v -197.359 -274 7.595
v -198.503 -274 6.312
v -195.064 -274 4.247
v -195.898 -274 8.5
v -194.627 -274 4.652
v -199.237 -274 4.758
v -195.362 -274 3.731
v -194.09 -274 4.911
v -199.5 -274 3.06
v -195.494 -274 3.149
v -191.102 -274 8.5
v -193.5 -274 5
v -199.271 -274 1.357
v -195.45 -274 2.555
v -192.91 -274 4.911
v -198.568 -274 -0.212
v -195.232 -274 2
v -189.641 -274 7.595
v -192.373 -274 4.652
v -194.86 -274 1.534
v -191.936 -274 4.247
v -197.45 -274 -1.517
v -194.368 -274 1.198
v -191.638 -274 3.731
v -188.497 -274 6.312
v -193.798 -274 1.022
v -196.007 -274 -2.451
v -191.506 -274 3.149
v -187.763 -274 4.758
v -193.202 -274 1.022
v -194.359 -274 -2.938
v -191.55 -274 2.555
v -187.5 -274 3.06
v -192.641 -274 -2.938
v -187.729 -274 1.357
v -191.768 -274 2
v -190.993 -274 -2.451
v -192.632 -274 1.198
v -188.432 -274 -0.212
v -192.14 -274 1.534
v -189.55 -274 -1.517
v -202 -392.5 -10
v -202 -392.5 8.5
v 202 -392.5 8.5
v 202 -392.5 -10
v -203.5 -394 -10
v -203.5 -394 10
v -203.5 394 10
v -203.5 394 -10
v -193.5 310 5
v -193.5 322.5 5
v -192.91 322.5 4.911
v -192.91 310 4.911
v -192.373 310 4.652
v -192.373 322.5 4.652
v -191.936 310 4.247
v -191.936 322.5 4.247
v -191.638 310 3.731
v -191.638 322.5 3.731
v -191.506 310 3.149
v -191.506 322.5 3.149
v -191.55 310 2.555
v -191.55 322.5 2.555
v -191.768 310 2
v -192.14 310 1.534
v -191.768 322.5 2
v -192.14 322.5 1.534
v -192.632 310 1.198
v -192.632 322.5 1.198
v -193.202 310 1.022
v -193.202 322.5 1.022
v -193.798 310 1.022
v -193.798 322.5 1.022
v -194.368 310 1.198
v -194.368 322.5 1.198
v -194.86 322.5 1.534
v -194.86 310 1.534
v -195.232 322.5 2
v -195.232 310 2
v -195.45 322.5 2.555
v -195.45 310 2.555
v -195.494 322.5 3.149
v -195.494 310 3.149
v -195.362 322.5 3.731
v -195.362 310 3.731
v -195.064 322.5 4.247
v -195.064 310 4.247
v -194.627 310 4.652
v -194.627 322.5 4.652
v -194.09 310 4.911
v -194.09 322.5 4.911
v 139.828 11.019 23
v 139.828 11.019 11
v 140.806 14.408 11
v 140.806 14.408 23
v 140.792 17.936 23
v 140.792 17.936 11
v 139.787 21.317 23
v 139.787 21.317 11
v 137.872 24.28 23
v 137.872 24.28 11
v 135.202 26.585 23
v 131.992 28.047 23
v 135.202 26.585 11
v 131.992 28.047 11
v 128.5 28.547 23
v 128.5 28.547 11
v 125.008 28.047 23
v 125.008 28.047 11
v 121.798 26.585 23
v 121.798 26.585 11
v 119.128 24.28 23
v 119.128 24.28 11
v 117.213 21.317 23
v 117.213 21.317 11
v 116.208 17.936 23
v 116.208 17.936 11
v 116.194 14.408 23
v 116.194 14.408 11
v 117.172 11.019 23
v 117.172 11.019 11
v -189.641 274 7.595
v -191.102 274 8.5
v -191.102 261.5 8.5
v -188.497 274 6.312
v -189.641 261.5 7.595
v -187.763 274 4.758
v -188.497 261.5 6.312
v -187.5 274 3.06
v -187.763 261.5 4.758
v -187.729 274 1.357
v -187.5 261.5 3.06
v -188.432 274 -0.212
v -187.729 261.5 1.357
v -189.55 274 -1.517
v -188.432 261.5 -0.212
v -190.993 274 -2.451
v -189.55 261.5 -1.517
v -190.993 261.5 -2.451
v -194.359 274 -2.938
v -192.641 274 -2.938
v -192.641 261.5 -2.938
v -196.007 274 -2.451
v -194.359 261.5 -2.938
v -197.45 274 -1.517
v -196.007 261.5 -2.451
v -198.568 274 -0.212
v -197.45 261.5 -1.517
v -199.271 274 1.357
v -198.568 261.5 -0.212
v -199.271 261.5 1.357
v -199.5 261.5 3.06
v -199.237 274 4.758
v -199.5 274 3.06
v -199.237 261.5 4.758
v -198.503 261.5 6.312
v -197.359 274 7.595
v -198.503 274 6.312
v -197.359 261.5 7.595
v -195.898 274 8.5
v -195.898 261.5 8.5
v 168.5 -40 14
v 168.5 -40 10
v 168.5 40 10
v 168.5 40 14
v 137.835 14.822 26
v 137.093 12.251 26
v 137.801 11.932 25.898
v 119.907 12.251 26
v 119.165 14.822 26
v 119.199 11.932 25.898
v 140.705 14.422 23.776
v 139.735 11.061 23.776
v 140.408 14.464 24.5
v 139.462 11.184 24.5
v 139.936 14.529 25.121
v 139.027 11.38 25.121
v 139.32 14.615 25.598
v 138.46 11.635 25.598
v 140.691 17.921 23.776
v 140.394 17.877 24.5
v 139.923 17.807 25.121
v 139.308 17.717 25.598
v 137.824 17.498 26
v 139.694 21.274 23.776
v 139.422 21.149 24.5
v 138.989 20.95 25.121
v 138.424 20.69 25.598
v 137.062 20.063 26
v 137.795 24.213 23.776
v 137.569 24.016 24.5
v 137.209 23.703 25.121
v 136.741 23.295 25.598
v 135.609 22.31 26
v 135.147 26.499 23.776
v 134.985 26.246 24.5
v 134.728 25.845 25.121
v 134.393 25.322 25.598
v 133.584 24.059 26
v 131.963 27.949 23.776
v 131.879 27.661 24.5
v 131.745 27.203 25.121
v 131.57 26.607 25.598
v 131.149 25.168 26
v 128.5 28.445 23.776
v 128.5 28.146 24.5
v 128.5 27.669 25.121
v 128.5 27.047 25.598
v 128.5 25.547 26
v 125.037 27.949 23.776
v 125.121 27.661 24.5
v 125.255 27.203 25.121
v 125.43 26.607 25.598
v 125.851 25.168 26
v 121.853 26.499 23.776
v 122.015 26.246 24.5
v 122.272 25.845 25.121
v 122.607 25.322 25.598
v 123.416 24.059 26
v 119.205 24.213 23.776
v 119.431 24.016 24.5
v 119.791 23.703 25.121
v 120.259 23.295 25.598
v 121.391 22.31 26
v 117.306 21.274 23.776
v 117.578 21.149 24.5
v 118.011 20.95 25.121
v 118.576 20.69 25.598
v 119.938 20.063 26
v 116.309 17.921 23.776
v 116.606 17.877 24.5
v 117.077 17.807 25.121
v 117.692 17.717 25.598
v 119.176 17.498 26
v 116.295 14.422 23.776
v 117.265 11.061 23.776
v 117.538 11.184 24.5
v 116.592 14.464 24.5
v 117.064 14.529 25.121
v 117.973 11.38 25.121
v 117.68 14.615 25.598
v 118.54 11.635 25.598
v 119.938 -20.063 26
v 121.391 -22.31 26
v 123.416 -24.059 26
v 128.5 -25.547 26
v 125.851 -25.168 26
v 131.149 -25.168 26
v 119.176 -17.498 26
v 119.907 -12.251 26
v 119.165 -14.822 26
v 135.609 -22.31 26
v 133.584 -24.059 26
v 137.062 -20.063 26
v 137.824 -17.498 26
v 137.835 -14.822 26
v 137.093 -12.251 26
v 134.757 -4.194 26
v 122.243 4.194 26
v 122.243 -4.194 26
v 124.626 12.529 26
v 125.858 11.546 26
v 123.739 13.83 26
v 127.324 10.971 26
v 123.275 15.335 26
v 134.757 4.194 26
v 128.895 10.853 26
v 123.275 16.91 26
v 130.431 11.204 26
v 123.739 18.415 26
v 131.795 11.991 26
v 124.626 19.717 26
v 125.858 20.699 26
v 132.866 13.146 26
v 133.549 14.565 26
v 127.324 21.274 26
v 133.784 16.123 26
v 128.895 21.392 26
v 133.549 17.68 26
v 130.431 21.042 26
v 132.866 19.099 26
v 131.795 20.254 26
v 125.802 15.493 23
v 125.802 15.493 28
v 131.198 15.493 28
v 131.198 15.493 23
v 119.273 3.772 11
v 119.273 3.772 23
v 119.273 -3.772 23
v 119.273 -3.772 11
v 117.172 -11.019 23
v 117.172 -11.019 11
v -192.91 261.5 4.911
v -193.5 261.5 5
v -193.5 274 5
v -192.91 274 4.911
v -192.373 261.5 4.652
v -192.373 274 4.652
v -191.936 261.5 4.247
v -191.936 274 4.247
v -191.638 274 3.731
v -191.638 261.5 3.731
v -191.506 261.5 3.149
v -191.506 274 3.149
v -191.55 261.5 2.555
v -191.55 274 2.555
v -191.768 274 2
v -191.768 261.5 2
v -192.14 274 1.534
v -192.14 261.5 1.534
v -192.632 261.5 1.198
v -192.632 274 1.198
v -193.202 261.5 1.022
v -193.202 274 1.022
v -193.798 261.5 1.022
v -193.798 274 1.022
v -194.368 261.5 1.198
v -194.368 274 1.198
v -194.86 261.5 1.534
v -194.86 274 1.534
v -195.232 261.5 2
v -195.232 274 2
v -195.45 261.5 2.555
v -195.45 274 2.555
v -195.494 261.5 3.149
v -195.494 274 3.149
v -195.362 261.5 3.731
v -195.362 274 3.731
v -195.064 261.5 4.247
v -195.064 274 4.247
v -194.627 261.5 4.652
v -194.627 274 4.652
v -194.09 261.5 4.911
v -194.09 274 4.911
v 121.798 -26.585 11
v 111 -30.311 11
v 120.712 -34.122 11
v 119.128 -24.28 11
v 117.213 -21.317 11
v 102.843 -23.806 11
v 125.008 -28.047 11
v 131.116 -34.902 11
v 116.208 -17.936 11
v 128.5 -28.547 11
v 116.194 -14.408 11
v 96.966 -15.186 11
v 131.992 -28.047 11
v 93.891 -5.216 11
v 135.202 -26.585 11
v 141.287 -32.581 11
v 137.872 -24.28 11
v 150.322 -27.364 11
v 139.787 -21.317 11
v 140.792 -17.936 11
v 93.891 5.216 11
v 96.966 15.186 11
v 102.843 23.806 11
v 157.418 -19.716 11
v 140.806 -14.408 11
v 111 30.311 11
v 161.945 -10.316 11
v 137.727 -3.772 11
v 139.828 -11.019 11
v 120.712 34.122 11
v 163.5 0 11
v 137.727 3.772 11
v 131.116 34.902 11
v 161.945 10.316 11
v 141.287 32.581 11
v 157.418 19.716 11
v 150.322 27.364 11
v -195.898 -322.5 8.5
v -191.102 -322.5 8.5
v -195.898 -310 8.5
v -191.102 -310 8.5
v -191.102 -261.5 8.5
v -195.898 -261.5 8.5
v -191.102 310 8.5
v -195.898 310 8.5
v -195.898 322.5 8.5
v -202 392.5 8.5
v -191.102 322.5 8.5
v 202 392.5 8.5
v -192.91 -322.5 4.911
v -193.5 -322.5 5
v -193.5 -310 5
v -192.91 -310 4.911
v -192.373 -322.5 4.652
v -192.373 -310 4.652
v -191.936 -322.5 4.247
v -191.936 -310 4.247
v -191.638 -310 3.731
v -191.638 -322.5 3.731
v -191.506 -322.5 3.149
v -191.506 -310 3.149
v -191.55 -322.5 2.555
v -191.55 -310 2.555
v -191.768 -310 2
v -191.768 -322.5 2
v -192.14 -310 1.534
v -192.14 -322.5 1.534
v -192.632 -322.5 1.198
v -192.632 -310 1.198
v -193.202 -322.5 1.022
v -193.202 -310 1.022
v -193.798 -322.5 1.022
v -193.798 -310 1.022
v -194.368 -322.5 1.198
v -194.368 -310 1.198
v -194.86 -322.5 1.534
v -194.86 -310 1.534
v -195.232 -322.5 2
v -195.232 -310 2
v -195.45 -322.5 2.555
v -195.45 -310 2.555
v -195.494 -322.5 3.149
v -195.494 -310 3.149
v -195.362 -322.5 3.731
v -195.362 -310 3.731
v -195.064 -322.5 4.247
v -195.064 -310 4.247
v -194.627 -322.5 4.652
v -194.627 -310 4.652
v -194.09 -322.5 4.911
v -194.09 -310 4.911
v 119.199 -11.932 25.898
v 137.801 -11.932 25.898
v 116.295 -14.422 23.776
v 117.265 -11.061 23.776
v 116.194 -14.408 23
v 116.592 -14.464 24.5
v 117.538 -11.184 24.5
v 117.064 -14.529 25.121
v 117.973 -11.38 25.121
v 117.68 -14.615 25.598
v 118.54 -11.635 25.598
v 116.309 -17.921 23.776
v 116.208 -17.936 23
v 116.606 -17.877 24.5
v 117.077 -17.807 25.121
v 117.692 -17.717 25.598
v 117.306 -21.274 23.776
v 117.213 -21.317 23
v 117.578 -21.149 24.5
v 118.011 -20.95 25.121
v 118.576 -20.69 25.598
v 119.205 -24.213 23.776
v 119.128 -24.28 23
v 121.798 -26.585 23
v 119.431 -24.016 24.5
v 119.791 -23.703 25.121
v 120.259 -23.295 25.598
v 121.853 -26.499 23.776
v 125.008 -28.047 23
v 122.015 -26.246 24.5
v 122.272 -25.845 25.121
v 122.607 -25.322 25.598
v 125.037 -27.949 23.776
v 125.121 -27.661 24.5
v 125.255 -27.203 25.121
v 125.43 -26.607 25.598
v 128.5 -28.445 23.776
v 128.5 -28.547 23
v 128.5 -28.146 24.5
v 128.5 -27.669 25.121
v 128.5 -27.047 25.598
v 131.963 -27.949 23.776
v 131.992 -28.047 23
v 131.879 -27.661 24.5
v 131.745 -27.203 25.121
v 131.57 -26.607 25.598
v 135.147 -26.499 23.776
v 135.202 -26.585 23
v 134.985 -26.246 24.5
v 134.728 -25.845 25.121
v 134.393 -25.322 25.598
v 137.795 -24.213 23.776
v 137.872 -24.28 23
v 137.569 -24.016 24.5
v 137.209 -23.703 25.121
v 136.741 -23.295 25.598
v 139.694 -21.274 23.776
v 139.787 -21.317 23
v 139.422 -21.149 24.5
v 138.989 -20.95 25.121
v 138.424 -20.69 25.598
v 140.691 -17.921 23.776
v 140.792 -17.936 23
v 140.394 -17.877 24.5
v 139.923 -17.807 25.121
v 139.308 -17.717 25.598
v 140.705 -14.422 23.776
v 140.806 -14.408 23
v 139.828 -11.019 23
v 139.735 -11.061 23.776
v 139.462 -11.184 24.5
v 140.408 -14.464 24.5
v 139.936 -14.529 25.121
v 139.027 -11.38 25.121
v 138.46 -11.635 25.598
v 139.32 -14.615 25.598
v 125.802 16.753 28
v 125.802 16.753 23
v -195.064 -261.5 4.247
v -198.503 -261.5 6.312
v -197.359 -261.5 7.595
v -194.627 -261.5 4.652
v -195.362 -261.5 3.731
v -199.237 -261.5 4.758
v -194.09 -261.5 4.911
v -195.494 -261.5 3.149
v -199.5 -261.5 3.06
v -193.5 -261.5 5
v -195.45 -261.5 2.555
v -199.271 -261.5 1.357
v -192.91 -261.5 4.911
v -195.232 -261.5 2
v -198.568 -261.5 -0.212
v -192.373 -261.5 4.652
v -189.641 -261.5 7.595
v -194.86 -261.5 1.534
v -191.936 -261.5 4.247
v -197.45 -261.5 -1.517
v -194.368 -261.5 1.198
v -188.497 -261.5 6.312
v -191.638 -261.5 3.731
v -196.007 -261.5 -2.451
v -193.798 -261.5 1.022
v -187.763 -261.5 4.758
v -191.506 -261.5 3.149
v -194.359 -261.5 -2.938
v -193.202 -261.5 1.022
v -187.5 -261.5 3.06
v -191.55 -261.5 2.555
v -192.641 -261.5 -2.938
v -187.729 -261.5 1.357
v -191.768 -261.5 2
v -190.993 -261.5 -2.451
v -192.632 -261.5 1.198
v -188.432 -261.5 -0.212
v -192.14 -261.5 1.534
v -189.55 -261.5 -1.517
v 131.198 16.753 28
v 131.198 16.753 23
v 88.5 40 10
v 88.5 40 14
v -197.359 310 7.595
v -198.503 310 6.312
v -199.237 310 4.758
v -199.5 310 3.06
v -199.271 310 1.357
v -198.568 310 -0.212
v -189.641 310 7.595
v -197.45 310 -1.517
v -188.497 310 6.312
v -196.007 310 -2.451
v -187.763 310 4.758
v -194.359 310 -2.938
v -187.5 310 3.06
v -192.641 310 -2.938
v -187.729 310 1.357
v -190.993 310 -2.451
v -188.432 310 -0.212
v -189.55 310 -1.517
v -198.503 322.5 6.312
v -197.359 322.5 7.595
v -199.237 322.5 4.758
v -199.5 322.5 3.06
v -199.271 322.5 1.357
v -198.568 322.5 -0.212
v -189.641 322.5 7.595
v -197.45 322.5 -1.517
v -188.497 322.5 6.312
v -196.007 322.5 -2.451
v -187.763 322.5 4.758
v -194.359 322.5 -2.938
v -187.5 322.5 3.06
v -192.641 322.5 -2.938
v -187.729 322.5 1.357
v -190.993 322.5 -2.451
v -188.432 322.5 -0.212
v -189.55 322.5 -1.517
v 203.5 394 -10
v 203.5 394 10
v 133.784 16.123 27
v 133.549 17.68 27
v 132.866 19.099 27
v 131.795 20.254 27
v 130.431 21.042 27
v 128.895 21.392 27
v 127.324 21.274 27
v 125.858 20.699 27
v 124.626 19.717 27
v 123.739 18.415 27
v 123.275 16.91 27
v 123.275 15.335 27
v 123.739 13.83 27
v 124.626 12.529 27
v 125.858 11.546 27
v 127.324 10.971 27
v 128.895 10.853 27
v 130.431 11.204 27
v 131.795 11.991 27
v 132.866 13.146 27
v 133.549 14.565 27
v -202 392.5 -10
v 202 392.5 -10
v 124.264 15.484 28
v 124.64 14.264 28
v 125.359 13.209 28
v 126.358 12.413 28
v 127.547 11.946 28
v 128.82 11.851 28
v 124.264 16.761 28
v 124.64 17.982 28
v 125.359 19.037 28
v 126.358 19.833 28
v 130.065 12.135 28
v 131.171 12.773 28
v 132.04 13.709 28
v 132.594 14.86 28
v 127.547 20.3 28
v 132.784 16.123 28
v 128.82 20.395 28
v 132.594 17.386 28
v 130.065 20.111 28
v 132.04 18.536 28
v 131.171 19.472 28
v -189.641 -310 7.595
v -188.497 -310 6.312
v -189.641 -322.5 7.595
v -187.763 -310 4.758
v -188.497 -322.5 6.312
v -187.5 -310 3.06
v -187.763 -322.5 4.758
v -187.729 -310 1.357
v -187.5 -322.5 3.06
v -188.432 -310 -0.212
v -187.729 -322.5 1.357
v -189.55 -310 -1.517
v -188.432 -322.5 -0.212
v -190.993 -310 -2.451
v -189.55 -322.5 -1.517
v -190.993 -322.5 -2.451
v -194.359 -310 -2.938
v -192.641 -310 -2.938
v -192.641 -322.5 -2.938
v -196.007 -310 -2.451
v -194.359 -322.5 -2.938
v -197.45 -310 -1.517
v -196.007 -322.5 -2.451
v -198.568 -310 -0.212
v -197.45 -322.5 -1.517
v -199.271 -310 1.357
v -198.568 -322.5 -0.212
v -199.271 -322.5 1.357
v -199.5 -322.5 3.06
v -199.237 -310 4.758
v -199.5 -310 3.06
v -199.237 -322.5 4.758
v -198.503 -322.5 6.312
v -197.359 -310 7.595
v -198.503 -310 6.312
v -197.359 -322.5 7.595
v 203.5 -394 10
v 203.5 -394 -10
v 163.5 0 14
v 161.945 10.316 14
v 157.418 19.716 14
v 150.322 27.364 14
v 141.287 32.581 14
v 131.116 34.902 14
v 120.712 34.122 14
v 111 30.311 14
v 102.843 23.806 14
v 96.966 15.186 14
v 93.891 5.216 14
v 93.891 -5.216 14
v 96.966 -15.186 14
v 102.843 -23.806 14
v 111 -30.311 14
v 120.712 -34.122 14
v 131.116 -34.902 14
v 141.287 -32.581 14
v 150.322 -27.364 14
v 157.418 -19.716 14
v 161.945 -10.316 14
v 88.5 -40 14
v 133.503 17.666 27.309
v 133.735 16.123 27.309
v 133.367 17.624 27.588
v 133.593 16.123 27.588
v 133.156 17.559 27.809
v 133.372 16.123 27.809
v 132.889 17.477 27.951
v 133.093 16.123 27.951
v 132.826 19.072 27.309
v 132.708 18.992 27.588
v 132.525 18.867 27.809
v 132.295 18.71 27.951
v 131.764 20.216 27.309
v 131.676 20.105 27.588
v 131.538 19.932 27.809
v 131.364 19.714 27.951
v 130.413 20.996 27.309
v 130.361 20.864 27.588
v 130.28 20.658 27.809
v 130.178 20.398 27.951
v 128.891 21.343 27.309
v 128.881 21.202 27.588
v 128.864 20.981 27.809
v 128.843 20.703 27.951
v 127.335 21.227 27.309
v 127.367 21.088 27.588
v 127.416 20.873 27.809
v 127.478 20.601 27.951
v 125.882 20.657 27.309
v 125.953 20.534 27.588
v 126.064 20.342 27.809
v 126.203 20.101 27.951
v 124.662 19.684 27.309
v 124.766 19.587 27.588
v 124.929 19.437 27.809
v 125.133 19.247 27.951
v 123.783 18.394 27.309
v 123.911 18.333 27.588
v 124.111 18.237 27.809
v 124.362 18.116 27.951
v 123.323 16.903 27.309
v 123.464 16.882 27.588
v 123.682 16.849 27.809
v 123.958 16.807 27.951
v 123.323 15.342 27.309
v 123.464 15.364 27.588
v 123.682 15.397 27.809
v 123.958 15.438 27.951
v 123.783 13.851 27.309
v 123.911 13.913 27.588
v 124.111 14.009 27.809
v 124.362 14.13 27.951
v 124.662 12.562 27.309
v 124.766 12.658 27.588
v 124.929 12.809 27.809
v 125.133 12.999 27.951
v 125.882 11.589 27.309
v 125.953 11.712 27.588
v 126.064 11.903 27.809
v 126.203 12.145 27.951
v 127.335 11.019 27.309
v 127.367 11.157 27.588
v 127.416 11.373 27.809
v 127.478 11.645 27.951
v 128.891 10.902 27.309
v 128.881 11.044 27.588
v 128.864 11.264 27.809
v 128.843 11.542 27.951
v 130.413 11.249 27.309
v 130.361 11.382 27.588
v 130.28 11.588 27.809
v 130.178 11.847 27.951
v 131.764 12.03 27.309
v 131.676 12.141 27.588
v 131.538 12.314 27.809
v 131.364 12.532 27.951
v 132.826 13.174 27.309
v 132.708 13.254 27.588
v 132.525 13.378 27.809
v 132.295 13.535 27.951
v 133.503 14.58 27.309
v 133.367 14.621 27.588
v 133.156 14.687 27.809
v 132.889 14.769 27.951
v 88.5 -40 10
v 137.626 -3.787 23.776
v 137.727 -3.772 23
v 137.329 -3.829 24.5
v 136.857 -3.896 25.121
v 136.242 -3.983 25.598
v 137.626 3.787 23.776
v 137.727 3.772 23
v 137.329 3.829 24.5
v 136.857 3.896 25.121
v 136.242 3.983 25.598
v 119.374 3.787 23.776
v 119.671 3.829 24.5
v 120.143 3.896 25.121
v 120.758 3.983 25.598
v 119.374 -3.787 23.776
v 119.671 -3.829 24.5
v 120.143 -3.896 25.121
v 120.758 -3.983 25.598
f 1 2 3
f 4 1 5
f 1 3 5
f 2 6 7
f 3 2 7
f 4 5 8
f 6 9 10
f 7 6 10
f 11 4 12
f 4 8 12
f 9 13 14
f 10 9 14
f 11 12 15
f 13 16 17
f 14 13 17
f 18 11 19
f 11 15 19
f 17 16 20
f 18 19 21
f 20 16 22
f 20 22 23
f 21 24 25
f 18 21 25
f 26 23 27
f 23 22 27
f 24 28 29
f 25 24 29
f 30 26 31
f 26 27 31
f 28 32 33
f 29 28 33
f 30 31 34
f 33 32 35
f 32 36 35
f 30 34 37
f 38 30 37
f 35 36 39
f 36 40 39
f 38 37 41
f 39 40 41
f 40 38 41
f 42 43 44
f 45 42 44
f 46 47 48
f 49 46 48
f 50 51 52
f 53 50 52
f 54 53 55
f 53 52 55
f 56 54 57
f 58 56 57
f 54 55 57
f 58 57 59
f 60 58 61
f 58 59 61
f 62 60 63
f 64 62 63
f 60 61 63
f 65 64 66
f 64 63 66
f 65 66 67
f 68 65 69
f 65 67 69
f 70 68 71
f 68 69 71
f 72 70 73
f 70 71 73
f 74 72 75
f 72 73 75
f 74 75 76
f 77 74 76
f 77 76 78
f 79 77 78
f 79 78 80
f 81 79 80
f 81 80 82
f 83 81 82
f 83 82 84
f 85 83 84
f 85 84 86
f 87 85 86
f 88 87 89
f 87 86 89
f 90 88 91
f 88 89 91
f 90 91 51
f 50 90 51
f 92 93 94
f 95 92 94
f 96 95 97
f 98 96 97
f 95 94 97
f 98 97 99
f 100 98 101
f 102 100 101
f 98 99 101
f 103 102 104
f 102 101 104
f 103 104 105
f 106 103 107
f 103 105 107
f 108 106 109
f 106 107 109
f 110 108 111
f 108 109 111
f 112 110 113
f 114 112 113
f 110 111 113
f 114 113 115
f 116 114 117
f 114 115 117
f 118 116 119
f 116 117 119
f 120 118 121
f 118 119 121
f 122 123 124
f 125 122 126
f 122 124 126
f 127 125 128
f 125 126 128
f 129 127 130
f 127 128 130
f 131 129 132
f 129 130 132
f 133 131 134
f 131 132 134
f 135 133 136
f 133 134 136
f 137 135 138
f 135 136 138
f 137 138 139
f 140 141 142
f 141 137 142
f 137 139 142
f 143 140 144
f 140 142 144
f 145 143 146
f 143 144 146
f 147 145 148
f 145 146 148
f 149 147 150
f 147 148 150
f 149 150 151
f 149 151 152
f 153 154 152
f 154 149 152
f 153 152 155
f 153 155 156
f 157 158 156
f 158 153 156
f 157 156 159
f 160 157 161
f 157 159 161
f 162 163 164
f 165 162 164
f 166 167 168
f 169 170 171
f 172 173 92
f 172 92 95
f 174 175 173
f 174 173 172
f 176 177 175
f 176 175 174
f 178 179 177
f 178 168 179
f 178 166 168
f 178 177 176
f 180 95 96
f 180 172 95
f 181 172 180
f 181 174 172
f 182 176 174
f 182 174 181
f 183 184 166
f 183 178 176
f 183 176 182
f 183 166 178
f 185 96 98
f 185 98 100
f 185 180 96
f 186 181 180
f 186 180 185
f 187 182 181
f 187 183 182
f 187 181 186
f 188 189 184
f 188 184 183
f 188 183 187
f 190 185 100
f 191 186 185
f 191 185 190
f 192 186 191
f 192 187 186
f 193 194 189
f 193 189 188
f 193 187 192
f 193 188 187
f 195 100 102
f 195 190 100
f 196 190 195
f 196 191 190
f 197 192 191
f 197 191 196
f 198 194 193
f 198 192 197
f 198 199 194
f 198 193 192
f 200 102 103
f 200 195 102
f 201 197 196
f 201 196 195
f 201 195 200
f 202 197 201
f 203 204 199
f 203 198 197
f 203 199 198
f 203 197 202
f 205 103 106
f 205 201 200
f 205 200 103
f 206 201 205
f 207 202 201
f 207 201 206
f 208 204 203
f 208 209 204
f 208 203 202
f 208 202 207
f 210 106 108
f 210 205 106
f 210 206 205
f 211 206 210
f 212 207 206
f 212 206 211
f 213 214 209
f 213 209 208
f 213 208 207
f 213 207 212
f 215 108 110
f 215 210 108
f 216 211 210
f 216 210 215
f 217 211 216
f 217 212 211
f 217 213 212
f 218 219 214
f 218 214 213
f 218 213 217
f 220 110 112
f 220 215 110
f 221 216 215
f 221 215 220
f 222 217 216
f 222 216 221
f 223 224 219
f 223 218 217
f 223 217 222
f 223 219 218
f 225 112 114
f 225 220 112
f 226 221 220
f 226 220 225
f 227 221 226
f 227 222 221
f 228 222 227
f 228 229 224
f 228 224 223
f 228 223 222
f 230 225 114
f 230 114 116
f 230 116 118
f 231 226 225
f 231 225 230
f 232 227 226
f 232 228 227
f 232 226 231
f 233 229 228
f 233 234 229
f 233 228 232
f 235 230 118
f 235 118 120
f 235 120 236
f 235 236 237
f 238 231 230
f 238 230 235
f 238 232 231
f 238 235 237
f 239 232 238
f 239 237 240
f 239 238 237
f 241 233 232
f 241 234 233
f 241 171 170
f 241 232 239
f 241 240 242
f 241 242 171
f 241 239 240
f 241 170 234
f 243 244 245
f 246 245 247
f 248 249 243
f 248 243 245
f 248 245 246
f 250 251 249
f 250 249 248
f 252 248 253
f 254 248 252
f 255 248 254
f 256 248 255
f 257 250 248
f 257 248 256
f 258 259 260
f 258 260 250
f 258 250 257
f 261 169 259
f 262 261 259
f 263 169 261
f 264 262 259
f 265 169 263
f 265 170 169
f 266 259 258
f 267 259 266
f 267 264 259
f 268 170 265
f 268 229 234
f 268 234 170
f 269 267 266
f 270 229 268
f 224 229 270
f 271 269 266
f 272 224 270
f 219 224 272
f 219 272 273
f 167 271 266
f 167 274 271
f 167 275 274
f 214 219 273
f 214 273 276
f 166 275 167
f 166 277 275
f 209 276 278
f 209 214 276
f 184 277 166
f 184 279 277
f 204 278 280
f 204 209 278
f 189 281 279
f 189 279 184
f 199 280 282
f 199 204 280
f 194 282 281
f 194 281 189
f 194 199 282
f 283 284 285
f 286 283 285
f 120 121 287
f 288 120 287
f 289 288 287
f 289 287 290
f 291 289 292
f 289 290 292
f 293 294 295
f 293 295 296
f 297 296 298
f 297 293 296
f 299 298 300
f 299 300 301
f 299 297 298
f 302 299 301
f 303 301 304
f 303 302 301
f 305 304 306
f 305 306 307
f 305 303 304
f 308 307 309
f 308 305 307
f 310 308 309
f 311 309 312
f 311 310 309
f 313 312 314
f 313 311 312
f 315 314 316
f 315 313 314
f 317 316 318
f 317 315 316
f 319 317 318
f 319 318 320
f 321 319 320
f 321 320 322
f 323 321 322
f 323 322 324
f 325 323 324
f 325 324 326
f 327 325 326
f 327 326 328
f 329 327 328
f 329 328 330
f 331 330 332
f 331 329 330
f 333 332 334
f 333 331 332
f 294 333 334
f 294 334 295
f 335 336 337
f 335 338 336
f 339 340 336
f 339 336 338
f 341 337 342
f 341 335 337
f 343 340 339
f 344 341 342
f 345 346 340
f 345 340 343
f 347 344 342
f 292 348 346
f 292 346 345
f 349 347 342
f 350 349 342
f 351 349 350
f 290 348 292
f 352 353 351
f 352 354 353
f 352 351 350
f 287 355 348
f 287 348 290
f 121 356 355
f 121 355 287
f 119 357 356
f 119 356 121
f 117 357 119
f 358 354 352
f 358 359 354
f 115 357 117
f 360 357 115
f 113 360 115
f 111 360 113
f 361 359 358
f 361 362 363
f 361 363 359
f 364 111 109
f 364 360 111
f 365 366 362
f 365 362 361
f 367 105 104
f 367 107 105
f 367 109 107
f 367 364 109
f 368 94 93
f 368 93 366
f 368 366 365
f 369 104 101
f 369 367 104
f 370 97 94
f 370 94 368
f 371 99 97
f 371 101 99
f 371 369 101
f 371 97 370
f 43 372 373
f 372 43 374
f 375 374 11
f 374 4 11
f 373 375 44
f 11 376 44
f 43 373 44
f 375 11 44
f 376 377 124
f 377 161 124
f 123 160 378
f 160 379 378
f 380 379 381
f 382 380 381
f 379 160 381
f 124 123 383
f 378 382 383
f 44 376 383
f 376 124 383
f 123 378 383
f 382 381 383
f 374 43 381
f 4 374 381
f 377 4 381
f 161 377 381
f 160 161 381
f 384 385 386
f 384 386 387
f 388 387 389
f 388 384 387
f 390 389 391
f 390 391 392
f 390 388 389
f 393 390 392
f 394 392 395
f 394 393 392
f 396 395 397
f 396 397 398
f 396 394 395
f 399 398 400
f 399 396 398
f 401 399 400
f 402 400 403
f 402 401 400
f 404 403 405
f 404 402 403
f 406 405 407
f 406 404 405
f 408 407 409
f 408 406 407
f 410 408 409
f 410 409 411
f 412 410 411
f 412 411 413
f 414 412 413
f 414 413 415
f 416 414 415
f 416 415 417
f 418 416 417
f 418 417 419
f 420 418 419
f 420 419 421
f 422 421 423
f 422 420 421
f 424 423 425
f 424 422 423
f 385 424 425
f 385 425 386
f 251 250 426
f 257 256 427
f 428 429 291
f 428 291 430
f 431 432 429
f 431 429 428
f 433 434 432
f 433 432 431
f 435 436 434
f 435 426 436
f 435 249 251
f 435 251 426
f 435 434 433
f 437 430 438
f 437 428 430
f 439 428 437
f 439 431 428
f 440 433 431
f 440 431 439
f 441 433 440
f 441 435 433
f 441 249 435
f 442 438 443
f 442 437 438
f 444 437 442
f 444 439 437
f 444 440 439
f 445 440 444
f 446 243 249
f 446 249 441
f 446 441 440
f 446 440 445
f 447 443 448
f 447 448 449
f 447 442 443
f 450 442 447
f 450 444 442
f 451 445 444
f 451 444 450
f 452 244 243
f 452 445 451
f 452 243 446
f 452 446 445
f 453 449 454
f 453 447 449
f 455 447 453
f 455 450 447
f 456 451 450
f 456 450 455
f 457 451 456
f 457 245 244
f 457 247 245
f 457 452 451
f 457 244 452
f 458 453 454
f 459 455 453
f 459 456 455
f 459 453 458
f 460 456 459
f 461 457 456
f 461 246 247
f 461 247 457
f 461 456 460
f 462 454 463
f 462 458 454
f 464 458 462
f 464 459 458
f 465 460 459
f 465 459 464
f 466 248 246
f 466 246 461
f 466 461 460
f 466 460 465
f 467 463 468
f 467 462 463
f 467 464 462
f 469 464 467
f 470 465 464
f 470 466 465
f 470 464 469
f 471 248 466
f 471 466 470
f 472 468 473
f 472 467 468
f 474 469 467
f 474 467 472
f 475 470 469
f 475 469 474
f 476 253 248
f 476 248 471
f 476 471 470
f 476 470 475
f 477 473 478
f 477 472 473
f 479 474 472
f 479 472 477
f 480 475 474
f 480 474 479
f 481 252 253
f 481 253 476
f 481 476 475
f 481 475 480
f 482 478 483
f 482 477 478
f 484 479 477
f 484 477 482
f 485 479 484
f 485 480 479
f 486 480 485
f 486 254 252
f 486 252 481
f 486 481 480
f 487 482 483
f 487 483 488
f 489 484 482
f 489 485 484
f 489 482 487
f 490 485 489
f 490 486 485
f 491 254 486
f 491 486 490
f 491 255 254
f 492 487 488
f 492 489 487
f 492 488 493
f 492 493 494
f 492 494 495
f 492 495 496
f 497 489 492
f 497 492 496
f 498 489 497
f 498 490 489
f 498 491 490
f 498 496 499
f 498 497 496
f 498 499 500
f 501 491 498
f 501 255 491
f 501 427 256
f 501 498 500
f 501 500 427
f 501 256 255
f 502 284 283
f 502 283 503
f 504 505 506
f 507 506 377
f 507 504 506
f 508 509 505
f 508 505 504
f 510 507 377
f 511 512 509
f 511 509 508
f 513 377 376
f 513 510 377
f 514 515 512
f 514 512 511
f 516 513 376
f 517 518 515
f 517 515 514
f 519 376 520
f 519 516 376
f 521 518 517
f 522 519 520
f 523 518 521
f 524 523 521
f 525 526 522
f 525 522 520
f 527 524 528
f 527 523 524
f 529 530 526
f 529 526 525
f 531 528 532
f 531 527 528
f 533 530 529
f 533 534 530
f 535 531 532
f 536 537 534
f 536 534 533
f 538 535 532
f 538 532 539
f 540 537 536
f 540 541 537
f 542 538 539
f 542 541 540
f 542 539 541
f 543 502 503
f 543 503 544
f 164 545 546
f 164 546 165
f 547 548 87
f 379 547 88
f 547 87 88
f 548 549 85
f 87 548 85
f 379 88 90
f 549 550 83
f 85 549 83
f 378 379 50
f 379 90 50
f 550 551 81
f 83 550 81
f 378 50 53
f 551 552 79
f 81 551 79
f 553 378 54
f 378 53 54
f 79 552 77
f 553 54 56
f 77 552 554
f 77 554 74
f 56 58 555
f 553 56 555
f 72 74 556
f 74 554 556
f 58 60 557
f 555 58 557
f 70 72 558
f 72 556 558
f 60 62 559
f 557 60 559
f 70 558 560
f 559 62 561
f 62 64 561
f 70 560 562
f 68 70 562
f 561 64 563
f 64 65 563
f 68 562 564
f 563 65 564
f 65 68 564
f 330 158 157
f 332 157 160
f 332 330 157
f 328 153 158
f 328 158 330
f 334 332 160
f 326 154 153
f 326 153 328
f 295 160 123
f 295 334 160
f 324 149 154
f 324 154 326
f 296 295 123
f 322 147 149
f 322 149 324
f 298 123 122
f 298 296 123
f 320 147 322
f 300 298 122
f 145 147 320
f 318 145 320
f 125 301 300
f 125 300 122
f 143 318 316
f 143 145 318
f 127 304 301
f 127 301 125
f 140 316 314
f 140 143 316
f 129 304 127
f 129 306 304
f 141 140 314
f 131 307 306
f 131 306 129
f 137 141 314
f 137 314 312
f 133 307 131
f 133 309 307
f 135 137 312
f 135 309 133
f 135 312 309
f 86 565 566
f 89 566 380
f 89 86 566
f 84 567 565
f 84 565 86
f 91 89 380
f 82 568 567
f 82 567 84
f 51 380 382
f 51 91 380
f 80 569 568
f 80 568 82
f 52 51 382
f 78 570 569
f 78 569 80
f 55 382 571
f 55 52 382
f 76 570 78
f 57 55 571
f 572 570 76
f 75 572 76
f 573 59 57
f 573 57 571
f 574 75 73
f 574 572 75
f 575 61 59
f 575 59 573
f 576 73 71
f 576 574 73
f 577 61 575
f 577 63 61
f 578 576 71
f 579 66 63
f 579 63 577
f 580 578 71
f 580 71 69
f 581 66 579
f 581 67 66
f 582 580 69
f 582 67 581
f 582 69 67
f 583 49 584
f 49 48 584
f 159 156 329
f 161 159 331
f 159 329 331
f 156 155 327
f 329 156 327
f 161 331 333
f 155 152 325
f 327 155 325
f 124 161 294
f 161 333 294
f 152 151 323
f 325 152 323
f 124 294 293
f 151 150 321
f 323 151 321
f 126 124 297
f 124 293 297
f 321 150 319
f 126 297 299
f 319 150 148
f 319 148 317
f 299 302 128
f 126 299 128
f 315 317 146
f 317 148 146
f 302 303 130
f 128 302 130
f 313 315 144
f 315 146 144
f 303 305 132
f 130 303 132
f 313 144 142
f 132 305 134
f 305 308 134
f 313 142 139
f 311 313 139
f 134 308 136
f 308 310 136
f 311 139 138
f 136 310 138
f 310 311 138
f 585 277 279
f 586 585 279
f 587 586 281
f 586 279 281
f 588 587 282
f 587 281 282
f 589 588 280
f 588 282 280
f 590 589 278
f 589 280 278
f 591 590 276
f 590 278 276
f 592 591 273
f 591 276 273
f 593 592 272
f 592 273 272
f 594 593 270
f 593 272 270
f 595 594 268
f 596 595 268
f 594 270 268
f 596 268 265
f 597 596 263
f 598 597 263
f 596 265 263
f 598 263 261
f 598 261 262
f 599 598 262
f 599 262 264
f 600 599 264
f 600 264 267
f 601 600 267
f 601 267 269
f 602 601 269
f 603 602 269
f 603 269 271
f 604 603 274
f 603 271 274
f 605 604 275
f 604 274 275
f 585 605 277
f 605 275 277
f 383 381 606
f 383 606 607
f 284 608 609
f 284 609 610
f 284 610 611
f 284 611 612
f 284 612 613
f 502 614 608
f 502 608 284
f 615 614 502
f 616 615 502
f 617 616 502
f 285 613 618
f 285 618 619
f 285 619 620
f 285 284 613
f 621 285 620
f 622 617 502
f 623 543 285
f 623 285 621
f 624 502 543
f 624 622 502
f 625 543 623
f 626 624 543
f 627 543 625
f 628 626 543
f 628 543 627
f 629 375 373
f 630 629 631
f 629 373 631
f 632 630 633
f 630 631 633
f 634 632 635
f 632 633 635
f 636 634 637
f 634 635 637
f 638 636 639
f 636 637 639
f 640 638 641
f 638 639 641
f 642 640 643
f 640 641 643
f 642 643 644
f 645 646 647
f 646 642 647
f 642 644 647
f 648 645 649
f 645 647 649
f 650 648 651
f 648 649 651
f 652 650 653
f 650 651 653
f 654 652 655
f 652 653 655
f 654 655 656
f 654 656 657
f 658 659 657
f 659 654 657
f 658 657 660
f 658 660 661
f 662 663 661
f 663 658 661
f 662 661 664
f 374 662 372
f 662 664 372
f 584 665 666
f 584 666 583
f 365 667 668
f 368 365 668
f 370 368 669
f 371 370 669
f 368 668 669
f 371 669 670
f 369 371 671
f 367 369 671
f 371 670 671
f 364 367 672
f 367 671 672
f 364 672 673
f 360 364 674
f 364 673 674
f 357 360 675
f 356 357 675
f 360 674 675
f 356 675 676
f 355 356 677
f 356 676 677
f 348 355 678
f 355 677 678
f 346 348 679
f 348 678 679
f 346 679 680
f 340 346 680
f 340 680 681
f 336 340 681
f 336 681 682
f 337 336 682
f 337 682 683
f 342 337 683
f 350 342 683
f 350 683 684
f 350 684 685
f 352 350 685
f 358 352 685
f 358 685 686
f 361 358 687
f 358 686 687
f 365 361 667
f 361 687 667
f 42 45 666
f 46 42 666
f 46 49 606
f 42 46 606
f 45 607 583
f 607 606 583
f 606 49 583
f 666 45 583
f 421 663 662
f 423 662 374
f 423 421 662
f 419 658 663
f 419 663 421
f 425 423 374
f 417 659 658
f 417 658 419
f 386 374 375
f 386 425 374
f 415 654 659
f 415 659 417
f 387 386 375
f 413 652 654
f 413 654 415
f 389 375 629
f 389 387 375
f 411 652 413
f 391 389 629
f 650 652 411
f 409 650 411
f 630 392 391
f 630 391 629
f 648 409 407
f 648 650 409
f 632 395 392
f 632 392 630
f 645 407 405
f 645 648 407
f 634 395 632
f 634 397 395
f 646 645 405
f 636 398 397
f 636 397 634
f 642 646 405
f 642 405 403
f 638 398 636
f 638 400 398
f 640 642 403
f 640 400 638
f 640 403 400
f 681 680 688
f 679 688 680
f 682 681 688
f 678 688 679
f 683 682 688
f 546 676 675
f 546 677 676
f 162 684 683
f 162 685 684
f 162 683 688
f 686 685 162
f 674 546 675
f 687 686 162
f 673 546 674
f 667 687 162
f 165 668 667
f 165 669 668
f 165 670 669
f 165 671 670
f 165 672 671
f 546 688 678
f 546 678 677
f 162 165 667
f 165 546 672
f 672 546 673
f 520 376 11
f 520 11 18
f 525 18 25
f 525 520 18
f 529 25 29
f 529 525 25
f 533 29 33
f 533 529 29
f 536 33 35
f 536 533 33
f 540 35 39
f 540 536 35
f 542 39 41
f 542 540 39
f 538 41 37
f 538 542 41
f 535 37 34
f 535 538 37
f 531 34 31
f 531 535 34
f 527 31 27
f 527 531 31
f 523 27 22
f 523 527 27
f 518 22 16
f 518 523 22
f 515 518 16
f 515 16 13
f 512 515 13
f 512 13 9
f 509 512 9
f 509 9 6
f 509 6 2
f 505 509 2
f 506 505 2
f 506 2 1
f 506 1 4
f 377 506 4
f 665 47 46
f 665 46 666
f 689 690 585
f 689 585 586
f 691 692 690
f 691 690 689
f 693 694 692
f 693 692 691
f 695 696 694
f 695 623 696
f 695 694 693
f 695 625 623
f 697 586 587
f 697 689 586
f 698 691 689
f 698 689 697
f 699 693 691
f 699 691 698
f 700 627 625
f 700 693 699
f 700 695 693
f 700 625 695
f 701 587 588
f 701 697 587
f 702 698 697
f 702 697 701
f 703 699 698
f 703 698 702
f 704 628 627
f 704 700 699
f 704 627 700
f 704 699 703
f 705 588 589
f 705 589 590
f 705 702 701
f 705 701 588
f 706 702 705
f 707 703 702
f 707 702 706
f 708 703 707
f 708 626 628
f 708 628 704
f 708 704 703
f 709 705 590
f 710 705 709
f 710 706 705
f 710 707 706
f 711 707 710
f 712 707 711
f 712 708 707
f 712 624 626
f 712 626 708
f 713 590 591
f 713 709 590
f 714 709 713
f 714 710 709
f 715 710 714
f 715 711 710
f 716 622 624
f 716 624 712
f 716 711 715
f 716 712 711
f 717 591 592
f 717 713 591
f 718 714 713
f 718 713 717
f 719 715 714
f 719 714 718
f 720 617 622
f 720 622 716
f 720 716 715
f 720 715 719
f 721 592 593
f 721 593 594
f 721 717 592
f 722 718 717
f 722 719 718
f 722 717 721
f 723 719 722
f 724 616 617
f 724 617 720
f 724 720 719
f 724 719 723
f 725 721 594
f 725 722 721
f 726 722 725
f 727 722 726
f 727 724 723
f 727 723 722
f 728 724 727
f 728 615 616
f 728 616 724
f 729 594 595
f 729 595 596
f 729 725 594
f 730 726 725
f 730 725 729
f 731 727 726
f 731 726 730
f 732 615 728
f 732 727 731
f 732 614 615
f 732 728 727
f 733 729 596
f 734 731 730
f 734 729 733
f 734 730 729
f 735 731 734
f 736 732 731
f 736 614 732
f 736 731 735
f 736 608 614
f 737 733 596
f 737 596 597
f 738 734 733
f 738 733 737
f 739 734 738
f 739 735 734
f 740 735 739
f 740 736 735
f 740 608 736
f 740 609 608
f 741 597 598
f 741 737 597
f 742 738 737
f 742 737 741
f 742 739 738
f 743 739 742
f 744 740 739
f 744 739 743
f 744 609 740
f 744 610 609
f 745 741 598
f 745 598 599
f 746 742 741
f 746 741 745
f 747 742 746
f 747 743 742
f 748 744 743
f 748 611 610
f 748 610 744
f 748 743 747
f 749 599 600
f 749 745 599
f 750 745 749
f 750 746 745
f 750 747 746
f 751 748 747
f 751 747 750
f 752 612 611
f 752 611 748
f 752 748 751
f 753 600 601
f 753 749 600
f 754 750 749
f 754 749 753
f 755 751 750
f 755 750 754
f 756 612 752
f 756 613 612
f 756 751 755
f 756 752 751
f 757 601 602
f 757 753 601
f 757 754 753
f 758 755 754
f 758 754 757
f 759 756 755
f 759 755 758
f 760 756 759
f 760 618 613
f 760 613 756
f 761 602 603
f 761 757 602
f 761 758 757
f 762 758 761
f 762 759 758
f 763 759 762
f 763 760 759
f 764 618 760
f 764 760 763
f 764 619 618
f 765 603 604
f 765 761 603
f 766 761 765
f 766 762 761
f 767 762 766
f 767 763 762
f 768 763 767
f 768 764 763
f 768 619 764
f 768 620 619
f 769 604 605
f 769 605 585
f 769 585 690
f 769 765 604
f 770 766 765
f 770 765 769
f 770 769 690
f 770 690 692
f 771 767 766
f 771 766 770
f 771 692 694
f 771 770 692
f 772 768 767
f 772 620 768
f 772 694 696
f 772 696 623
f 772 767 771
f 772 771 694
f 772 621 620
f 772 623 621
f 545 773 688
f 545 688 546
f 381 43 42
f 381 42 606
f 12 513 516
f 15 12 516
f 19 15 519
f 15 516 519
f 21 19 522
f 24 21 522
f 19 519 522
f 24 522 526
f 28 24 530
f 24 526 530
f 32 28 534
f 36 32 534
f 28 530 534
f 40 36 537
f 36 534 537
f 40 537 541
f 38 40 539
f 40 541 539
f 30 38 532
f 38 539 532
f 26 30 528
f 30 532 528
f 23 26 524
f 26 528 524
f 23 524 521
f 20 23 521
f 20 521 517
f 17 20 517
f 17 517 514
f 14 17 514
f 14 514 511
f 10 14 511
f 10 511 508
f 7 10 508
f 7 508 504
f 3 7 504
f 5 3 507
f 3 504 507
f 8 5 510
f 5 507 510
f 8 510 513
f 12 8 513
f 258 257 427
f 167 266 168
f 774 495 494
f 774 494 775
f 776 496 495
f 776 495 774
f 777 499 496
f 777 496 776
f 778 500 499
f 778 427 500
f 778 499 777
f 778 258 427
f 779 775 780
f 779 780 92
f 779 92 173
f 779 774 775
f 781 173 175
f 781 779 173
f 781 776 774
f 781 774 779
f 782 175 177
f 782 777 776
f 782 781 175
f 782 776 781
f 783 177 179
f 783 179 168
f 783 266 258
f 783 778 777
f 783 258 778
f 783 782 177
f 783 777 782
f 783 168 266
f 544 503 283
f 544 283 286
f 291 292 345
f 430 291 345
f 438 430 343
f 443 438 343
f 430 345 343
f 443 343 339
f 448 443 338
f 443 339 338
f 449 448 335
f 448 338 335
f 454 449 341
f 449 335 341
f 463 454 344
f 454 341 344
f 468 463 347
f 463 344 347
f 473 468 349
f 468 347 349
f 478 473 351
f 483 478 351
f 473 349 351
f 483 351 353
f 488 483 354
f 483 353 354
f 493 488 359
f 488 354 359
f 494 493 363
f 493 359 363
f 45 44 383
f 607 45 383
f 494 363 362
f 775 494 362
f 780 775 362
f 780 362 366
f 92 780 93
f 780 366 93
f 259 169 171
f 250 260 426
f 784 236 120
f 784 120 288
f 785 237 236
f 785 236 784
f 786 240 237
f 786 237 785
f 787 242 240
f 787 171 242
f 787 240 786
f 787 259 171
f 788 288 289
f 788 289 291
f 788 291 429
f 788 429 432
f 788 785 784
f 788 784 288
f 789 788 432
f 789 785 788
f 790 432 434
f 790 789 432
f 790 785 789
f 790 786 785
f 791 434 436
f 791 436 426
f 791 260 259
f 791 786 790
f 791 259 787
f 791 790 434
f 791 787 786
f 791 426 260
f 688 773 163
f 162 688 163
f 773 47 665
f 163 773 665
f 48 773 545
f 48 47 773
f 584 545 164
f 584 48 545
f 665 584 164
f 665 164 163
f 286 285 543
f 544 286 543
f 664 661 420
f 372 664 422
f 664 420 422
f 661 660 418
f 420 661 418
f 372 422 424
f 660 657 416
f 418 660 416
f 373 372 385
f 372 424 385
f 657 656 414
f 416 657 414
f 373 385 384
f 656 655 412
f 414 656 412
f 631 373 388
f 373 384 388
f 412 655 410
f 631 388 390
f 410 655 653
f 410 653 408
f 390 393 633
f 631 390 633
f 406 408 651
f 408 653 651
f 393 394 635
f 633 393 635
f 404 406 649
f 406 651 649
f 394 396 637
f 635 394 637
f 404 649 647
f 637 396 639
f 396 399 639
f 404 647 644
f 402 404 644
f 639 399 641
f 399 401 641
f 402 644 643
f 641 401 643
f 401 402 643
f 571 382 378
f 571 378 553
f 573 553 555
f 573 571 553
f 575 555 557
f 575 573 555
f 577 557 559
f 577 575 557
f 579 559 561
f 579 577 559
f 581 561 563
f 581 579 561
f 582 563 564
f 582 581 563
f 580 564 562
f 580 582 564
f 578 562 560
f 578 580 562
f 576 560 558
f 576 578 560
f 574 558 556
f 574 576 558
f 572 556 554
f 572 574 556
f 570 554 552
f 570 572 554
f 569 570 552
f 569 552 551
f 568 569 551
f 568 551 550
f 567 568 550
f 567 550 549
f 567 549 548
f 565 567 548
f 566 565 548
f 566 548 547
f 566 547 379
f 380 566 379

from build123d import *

# Parameters (mm, degrees)
SKETCH1_W                 = 407
SKETCH1_H                 = 788
BOSS_EXTRUDE1_DEPTH       = 10
SHELL1_T                  = -1.5
SKETCH2_W                 = 80
SKETCH2_H                 = 80
BOSS_EXTRUDE2_DEPTH       = 4
SKETCH3_R                 = 35
CUT_EXTRUDE1_DEPTH        = 3
BOSS_EXTRUDE3_DEPTH       = 15
SKETCH5_R                 = 5.284188489
BOSS_EXTRUDE4_DEPTH       = 2
FILLET1_R                 = 3
FILLET2_R                 = 1
SKETCH6_W                 = 5.396205122
SKETCH6_H                 = 1.259856044
CUT_EXTRUDE2_DEPTH        = 5
BOSS_EXTRUDE5_START       = -71.5
SKETCH7_R                 = 6
SKETCH7_R_2               = 2
BOSS_EXTRUDE5_DEPTH       = 12.5
MIRROR2_START             = -71.5
MIRROR2_COPY_1_SKETCH_R   = 6
MIRROR2_COPY_1_SKETCH_R_2 = 2
MIRROR2_COPY_1_DEPTH      = 12.5


with BuildPart() as part:
    # Sketch1 → Boss-Extrude1 (new, symmetric)
    with BuildSketch(Plane.XY):
        Rectangle(SKETCH1_W, SKETCH1_H)
    extrude(amount=BOSS_EXTRUDE1_DEPTH, both=True)

    # Shell1
    shell1_openings = [part.faces().sort_by_distance(p)[0] for p in [
        (0, 0, -10),
    ]]
    offset(amount=SHELL1_T, openings=shell1_openings, kind=Kind.INTERSECTION)

    # Sketch2 → Boss-Extrude2 (add)
    with BuildSketch(Plane.XY.offset(10)):
        with Locations((128.5, 0)):
            Rectangle(SKETCH2_W, SKETCH2_H)
    extrude(amount=BOSS_EXTRUDE2_DEPTH)

    # Sketch3 → Cut-Extrude1 (cut)
    with BuildSketch(Plane.XY.offset(14)):
        with Locations((128.5, 0)):
            Circle(SKETCH3_R)
    extrude(amount=-CUT_EXTRUDE1_DEPTH, mode=Mode.SUBTRACT)

    # Sketch4 → Boss-Extrude3 (add)
    with BuildSketch(Plane.XY.offset(11)):
        with BuildLine():
            ThreePointArc((139.828046269, 11.018836293), (128.5, 28.547480442), (117.171953731, 11.018836293))
            ThreePointArc((117.171953731, 11.018836293), (119.53963249, 0), (117.171953731, -11.018836293))
            ThreePointArc((117.171953731, -11.018836293), (128.5, -28.547480442), (139.828046269, -11.018836293))
            ThreePointArc((139.828046269, -11.018836293), (137.46036751, 0), (139.828046269, 11.018836293))
        make_face()
    extrude(amount=BOSS_EXTRUDE3_DEPTH)

    # Sketch5 → Boss-Extrude4 (add)
    with BuildSketch(Plane.XY.offset(26)):
        with Locations((128.5, 16.12273172)):
            Circle(SKETCH5_R)
    extrude(amount=BOSS_EXTRUDE4_DEPTH)

    # Fillet1
    fillet1_edges = [part.edges().sort_by_distance(p)[0] for p in [
        (137.46036751, 0, 26),
        (128.5, 28.547480442, 26),
        (119.53963249, 0, 26),
        (128.5, -28.547480442, 26),
    ]]
    fillet(fillet1_edges, radius=FILLET1_R)

    # Fillet2
    fillet2_edges = [part.edges().sort_by_distance(p)[0] for p in [
        (123.215811511, 16.12273172, 28),
    ]]
    fillet(fillet2_edges, radius=FILLET2_R)

    # Sketch6 → Cut-Extrude2 (cut)
    with BuildSketch(Plane.XY.offset(28)):
        with Locations((128.5, 16.12273172)):
            Rectangle(SKETCH6_W, SKETCH6_H)
    extrude(amount=-CUT_EXTRUDE2_DEPTH, mode=Mode.SUBTRACT)

    # Sketch7 → Boss-Extrude5 (add)
    with BuildSketch(Plane(origin=(0, 394, 0), x_dir=(1, 0, 0), z_dir=(0, 1, 0)).offset(BOSS_EXTRUDE5_START)):
        with Locations((-193.5, -3)):
            Circle(SKETCH7_R)
        with Locations(Location((-193.5, -3, 0), (0, 0, 270))):
            Circle(SKETCH7_R_2, mode=Mode.SUBTRACT)
    boss_extrude5 = extrude(amount=-BOSS_EXTRUDE5_DEPTH)

    # Mirror1: Boss-Extrude5 across plane
    add(boss_extrude5.mirror(Plane(origin=(0, 292, 0), x_dir=(0, 0, 1), z_dir=(0, -1, 0))))

    # Mirror2: Boss-Extrude5 across plane
    add(boss_extrude5.mirror(Plane.ZX))

    # Mirror2 copy 1 sketch → Mirror2 copy 1 (add)
    with BuildSketch(Plane(origin=(0, -190, 0), x_dir=(1, 0, 0), z_dir=(0, 1, 0)).offset(MIRROR2_START)):
        with Locations((-193.5, -3)):
            Circle(MIRROR2_COPY_1_SKETCH_R)
        with Locations(Location((-193.5, -3, 0), (0, 0, 270))):
            Circle(MIRROR2_COPY_1_SKETCH_R_2, mode=Mode.SUBTRACT)
    extrude(amount=-MIRROR2_COPY_1_DEPTH)


solid = part.part
